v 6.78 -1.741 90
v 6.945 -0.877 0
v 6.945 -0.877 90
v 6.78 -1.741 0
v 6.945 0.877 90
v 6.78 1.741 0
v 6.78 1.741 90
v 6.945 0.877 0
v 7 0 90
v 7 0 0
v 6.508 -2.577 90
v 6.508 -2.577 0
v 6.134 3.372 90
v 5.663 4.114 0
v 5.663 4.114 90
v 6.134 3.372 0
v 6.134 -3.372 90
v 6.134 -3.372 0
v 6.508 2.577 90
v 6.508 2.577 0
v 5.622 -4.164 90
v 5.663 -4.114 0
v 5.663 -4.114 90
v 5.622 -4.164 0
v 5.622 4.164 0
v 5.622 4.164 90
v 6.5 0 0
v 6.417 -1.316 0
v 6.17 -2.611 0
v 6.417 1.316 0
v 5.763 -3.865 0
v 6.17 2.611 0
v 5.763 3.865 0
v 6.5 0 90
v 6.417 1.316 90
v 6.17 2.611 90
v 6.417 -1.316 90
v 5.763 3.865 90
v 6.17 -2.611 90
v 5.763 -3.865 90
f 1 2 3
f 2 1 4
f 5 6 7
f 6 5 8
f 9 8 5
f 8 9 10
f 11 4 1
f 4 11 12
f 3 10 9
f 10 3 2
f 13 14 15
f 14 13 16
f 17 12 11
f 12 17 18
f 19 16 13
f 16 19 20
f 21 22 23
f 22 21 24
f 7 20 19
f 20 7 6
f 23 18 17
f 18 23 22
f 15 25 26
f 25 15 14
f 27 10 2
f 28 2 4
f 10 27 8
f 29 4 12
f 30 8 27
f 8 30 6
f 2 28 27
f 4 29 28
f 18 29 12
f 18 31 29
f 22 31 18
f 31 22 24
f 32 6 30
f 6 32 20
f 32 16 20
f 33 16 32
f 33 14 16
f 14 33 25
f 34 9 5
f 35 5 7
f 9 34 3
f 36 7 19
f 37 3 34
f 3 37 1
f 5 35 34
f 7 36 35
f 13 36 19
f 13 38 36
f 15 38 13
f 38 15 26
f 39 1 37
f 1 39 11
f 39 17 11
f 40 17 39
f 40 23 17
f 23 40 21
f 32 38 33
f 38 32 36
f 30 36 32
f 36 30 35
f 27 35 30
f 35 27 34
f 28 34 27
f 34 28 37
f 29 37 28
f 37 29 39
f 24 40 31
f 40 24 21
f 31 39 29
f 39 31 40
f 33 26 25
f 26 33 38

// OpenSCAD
$fn = 50;


difference() {
	union() {
		cylinder(h = 90, r = 7.0000000000);
		translate(v = [-7.0000000000, 0, 0]) {
			cylinder(h = 90, r = 7.0000000000);
		}
	}
	union() {
		cylinder(h = 90, r = 3.2500000000);
		cylinder(h = 90, r = 1.8000000000);
		cylinder(h = 90, r = 1.8000000000);
		cylinder(h = 90, r = 1.8000000000);
		translate(v = [-11.5000000000, 0, 0]) {
			hull() {
				translate(v = [-3.7500000000, 0.0000000000, 0]) {
					cylinder(h = 90, r = 7.5000000000);
				}
				translate(v = [3.7500000000, 0.0000000000, 0]) {
					cylinder(h = 90, r = 7.5000000000);
				}
				translate(v = [-3.7500000000, -0.0000000000, 0]) {
					cylinder(h = 90, r = 7.5000000000);
				}
				translate(v = [3.7500000000, -0.0000000000, 0]) {
					cylinder(h = 90, r = 7.5000000000);
				}
			}
		}
		translate(v = [-4.0000000000, 0, 0.0000000000]) {
			cylinder(h = 90, r = 10.5000000000);
		}
	}
}
